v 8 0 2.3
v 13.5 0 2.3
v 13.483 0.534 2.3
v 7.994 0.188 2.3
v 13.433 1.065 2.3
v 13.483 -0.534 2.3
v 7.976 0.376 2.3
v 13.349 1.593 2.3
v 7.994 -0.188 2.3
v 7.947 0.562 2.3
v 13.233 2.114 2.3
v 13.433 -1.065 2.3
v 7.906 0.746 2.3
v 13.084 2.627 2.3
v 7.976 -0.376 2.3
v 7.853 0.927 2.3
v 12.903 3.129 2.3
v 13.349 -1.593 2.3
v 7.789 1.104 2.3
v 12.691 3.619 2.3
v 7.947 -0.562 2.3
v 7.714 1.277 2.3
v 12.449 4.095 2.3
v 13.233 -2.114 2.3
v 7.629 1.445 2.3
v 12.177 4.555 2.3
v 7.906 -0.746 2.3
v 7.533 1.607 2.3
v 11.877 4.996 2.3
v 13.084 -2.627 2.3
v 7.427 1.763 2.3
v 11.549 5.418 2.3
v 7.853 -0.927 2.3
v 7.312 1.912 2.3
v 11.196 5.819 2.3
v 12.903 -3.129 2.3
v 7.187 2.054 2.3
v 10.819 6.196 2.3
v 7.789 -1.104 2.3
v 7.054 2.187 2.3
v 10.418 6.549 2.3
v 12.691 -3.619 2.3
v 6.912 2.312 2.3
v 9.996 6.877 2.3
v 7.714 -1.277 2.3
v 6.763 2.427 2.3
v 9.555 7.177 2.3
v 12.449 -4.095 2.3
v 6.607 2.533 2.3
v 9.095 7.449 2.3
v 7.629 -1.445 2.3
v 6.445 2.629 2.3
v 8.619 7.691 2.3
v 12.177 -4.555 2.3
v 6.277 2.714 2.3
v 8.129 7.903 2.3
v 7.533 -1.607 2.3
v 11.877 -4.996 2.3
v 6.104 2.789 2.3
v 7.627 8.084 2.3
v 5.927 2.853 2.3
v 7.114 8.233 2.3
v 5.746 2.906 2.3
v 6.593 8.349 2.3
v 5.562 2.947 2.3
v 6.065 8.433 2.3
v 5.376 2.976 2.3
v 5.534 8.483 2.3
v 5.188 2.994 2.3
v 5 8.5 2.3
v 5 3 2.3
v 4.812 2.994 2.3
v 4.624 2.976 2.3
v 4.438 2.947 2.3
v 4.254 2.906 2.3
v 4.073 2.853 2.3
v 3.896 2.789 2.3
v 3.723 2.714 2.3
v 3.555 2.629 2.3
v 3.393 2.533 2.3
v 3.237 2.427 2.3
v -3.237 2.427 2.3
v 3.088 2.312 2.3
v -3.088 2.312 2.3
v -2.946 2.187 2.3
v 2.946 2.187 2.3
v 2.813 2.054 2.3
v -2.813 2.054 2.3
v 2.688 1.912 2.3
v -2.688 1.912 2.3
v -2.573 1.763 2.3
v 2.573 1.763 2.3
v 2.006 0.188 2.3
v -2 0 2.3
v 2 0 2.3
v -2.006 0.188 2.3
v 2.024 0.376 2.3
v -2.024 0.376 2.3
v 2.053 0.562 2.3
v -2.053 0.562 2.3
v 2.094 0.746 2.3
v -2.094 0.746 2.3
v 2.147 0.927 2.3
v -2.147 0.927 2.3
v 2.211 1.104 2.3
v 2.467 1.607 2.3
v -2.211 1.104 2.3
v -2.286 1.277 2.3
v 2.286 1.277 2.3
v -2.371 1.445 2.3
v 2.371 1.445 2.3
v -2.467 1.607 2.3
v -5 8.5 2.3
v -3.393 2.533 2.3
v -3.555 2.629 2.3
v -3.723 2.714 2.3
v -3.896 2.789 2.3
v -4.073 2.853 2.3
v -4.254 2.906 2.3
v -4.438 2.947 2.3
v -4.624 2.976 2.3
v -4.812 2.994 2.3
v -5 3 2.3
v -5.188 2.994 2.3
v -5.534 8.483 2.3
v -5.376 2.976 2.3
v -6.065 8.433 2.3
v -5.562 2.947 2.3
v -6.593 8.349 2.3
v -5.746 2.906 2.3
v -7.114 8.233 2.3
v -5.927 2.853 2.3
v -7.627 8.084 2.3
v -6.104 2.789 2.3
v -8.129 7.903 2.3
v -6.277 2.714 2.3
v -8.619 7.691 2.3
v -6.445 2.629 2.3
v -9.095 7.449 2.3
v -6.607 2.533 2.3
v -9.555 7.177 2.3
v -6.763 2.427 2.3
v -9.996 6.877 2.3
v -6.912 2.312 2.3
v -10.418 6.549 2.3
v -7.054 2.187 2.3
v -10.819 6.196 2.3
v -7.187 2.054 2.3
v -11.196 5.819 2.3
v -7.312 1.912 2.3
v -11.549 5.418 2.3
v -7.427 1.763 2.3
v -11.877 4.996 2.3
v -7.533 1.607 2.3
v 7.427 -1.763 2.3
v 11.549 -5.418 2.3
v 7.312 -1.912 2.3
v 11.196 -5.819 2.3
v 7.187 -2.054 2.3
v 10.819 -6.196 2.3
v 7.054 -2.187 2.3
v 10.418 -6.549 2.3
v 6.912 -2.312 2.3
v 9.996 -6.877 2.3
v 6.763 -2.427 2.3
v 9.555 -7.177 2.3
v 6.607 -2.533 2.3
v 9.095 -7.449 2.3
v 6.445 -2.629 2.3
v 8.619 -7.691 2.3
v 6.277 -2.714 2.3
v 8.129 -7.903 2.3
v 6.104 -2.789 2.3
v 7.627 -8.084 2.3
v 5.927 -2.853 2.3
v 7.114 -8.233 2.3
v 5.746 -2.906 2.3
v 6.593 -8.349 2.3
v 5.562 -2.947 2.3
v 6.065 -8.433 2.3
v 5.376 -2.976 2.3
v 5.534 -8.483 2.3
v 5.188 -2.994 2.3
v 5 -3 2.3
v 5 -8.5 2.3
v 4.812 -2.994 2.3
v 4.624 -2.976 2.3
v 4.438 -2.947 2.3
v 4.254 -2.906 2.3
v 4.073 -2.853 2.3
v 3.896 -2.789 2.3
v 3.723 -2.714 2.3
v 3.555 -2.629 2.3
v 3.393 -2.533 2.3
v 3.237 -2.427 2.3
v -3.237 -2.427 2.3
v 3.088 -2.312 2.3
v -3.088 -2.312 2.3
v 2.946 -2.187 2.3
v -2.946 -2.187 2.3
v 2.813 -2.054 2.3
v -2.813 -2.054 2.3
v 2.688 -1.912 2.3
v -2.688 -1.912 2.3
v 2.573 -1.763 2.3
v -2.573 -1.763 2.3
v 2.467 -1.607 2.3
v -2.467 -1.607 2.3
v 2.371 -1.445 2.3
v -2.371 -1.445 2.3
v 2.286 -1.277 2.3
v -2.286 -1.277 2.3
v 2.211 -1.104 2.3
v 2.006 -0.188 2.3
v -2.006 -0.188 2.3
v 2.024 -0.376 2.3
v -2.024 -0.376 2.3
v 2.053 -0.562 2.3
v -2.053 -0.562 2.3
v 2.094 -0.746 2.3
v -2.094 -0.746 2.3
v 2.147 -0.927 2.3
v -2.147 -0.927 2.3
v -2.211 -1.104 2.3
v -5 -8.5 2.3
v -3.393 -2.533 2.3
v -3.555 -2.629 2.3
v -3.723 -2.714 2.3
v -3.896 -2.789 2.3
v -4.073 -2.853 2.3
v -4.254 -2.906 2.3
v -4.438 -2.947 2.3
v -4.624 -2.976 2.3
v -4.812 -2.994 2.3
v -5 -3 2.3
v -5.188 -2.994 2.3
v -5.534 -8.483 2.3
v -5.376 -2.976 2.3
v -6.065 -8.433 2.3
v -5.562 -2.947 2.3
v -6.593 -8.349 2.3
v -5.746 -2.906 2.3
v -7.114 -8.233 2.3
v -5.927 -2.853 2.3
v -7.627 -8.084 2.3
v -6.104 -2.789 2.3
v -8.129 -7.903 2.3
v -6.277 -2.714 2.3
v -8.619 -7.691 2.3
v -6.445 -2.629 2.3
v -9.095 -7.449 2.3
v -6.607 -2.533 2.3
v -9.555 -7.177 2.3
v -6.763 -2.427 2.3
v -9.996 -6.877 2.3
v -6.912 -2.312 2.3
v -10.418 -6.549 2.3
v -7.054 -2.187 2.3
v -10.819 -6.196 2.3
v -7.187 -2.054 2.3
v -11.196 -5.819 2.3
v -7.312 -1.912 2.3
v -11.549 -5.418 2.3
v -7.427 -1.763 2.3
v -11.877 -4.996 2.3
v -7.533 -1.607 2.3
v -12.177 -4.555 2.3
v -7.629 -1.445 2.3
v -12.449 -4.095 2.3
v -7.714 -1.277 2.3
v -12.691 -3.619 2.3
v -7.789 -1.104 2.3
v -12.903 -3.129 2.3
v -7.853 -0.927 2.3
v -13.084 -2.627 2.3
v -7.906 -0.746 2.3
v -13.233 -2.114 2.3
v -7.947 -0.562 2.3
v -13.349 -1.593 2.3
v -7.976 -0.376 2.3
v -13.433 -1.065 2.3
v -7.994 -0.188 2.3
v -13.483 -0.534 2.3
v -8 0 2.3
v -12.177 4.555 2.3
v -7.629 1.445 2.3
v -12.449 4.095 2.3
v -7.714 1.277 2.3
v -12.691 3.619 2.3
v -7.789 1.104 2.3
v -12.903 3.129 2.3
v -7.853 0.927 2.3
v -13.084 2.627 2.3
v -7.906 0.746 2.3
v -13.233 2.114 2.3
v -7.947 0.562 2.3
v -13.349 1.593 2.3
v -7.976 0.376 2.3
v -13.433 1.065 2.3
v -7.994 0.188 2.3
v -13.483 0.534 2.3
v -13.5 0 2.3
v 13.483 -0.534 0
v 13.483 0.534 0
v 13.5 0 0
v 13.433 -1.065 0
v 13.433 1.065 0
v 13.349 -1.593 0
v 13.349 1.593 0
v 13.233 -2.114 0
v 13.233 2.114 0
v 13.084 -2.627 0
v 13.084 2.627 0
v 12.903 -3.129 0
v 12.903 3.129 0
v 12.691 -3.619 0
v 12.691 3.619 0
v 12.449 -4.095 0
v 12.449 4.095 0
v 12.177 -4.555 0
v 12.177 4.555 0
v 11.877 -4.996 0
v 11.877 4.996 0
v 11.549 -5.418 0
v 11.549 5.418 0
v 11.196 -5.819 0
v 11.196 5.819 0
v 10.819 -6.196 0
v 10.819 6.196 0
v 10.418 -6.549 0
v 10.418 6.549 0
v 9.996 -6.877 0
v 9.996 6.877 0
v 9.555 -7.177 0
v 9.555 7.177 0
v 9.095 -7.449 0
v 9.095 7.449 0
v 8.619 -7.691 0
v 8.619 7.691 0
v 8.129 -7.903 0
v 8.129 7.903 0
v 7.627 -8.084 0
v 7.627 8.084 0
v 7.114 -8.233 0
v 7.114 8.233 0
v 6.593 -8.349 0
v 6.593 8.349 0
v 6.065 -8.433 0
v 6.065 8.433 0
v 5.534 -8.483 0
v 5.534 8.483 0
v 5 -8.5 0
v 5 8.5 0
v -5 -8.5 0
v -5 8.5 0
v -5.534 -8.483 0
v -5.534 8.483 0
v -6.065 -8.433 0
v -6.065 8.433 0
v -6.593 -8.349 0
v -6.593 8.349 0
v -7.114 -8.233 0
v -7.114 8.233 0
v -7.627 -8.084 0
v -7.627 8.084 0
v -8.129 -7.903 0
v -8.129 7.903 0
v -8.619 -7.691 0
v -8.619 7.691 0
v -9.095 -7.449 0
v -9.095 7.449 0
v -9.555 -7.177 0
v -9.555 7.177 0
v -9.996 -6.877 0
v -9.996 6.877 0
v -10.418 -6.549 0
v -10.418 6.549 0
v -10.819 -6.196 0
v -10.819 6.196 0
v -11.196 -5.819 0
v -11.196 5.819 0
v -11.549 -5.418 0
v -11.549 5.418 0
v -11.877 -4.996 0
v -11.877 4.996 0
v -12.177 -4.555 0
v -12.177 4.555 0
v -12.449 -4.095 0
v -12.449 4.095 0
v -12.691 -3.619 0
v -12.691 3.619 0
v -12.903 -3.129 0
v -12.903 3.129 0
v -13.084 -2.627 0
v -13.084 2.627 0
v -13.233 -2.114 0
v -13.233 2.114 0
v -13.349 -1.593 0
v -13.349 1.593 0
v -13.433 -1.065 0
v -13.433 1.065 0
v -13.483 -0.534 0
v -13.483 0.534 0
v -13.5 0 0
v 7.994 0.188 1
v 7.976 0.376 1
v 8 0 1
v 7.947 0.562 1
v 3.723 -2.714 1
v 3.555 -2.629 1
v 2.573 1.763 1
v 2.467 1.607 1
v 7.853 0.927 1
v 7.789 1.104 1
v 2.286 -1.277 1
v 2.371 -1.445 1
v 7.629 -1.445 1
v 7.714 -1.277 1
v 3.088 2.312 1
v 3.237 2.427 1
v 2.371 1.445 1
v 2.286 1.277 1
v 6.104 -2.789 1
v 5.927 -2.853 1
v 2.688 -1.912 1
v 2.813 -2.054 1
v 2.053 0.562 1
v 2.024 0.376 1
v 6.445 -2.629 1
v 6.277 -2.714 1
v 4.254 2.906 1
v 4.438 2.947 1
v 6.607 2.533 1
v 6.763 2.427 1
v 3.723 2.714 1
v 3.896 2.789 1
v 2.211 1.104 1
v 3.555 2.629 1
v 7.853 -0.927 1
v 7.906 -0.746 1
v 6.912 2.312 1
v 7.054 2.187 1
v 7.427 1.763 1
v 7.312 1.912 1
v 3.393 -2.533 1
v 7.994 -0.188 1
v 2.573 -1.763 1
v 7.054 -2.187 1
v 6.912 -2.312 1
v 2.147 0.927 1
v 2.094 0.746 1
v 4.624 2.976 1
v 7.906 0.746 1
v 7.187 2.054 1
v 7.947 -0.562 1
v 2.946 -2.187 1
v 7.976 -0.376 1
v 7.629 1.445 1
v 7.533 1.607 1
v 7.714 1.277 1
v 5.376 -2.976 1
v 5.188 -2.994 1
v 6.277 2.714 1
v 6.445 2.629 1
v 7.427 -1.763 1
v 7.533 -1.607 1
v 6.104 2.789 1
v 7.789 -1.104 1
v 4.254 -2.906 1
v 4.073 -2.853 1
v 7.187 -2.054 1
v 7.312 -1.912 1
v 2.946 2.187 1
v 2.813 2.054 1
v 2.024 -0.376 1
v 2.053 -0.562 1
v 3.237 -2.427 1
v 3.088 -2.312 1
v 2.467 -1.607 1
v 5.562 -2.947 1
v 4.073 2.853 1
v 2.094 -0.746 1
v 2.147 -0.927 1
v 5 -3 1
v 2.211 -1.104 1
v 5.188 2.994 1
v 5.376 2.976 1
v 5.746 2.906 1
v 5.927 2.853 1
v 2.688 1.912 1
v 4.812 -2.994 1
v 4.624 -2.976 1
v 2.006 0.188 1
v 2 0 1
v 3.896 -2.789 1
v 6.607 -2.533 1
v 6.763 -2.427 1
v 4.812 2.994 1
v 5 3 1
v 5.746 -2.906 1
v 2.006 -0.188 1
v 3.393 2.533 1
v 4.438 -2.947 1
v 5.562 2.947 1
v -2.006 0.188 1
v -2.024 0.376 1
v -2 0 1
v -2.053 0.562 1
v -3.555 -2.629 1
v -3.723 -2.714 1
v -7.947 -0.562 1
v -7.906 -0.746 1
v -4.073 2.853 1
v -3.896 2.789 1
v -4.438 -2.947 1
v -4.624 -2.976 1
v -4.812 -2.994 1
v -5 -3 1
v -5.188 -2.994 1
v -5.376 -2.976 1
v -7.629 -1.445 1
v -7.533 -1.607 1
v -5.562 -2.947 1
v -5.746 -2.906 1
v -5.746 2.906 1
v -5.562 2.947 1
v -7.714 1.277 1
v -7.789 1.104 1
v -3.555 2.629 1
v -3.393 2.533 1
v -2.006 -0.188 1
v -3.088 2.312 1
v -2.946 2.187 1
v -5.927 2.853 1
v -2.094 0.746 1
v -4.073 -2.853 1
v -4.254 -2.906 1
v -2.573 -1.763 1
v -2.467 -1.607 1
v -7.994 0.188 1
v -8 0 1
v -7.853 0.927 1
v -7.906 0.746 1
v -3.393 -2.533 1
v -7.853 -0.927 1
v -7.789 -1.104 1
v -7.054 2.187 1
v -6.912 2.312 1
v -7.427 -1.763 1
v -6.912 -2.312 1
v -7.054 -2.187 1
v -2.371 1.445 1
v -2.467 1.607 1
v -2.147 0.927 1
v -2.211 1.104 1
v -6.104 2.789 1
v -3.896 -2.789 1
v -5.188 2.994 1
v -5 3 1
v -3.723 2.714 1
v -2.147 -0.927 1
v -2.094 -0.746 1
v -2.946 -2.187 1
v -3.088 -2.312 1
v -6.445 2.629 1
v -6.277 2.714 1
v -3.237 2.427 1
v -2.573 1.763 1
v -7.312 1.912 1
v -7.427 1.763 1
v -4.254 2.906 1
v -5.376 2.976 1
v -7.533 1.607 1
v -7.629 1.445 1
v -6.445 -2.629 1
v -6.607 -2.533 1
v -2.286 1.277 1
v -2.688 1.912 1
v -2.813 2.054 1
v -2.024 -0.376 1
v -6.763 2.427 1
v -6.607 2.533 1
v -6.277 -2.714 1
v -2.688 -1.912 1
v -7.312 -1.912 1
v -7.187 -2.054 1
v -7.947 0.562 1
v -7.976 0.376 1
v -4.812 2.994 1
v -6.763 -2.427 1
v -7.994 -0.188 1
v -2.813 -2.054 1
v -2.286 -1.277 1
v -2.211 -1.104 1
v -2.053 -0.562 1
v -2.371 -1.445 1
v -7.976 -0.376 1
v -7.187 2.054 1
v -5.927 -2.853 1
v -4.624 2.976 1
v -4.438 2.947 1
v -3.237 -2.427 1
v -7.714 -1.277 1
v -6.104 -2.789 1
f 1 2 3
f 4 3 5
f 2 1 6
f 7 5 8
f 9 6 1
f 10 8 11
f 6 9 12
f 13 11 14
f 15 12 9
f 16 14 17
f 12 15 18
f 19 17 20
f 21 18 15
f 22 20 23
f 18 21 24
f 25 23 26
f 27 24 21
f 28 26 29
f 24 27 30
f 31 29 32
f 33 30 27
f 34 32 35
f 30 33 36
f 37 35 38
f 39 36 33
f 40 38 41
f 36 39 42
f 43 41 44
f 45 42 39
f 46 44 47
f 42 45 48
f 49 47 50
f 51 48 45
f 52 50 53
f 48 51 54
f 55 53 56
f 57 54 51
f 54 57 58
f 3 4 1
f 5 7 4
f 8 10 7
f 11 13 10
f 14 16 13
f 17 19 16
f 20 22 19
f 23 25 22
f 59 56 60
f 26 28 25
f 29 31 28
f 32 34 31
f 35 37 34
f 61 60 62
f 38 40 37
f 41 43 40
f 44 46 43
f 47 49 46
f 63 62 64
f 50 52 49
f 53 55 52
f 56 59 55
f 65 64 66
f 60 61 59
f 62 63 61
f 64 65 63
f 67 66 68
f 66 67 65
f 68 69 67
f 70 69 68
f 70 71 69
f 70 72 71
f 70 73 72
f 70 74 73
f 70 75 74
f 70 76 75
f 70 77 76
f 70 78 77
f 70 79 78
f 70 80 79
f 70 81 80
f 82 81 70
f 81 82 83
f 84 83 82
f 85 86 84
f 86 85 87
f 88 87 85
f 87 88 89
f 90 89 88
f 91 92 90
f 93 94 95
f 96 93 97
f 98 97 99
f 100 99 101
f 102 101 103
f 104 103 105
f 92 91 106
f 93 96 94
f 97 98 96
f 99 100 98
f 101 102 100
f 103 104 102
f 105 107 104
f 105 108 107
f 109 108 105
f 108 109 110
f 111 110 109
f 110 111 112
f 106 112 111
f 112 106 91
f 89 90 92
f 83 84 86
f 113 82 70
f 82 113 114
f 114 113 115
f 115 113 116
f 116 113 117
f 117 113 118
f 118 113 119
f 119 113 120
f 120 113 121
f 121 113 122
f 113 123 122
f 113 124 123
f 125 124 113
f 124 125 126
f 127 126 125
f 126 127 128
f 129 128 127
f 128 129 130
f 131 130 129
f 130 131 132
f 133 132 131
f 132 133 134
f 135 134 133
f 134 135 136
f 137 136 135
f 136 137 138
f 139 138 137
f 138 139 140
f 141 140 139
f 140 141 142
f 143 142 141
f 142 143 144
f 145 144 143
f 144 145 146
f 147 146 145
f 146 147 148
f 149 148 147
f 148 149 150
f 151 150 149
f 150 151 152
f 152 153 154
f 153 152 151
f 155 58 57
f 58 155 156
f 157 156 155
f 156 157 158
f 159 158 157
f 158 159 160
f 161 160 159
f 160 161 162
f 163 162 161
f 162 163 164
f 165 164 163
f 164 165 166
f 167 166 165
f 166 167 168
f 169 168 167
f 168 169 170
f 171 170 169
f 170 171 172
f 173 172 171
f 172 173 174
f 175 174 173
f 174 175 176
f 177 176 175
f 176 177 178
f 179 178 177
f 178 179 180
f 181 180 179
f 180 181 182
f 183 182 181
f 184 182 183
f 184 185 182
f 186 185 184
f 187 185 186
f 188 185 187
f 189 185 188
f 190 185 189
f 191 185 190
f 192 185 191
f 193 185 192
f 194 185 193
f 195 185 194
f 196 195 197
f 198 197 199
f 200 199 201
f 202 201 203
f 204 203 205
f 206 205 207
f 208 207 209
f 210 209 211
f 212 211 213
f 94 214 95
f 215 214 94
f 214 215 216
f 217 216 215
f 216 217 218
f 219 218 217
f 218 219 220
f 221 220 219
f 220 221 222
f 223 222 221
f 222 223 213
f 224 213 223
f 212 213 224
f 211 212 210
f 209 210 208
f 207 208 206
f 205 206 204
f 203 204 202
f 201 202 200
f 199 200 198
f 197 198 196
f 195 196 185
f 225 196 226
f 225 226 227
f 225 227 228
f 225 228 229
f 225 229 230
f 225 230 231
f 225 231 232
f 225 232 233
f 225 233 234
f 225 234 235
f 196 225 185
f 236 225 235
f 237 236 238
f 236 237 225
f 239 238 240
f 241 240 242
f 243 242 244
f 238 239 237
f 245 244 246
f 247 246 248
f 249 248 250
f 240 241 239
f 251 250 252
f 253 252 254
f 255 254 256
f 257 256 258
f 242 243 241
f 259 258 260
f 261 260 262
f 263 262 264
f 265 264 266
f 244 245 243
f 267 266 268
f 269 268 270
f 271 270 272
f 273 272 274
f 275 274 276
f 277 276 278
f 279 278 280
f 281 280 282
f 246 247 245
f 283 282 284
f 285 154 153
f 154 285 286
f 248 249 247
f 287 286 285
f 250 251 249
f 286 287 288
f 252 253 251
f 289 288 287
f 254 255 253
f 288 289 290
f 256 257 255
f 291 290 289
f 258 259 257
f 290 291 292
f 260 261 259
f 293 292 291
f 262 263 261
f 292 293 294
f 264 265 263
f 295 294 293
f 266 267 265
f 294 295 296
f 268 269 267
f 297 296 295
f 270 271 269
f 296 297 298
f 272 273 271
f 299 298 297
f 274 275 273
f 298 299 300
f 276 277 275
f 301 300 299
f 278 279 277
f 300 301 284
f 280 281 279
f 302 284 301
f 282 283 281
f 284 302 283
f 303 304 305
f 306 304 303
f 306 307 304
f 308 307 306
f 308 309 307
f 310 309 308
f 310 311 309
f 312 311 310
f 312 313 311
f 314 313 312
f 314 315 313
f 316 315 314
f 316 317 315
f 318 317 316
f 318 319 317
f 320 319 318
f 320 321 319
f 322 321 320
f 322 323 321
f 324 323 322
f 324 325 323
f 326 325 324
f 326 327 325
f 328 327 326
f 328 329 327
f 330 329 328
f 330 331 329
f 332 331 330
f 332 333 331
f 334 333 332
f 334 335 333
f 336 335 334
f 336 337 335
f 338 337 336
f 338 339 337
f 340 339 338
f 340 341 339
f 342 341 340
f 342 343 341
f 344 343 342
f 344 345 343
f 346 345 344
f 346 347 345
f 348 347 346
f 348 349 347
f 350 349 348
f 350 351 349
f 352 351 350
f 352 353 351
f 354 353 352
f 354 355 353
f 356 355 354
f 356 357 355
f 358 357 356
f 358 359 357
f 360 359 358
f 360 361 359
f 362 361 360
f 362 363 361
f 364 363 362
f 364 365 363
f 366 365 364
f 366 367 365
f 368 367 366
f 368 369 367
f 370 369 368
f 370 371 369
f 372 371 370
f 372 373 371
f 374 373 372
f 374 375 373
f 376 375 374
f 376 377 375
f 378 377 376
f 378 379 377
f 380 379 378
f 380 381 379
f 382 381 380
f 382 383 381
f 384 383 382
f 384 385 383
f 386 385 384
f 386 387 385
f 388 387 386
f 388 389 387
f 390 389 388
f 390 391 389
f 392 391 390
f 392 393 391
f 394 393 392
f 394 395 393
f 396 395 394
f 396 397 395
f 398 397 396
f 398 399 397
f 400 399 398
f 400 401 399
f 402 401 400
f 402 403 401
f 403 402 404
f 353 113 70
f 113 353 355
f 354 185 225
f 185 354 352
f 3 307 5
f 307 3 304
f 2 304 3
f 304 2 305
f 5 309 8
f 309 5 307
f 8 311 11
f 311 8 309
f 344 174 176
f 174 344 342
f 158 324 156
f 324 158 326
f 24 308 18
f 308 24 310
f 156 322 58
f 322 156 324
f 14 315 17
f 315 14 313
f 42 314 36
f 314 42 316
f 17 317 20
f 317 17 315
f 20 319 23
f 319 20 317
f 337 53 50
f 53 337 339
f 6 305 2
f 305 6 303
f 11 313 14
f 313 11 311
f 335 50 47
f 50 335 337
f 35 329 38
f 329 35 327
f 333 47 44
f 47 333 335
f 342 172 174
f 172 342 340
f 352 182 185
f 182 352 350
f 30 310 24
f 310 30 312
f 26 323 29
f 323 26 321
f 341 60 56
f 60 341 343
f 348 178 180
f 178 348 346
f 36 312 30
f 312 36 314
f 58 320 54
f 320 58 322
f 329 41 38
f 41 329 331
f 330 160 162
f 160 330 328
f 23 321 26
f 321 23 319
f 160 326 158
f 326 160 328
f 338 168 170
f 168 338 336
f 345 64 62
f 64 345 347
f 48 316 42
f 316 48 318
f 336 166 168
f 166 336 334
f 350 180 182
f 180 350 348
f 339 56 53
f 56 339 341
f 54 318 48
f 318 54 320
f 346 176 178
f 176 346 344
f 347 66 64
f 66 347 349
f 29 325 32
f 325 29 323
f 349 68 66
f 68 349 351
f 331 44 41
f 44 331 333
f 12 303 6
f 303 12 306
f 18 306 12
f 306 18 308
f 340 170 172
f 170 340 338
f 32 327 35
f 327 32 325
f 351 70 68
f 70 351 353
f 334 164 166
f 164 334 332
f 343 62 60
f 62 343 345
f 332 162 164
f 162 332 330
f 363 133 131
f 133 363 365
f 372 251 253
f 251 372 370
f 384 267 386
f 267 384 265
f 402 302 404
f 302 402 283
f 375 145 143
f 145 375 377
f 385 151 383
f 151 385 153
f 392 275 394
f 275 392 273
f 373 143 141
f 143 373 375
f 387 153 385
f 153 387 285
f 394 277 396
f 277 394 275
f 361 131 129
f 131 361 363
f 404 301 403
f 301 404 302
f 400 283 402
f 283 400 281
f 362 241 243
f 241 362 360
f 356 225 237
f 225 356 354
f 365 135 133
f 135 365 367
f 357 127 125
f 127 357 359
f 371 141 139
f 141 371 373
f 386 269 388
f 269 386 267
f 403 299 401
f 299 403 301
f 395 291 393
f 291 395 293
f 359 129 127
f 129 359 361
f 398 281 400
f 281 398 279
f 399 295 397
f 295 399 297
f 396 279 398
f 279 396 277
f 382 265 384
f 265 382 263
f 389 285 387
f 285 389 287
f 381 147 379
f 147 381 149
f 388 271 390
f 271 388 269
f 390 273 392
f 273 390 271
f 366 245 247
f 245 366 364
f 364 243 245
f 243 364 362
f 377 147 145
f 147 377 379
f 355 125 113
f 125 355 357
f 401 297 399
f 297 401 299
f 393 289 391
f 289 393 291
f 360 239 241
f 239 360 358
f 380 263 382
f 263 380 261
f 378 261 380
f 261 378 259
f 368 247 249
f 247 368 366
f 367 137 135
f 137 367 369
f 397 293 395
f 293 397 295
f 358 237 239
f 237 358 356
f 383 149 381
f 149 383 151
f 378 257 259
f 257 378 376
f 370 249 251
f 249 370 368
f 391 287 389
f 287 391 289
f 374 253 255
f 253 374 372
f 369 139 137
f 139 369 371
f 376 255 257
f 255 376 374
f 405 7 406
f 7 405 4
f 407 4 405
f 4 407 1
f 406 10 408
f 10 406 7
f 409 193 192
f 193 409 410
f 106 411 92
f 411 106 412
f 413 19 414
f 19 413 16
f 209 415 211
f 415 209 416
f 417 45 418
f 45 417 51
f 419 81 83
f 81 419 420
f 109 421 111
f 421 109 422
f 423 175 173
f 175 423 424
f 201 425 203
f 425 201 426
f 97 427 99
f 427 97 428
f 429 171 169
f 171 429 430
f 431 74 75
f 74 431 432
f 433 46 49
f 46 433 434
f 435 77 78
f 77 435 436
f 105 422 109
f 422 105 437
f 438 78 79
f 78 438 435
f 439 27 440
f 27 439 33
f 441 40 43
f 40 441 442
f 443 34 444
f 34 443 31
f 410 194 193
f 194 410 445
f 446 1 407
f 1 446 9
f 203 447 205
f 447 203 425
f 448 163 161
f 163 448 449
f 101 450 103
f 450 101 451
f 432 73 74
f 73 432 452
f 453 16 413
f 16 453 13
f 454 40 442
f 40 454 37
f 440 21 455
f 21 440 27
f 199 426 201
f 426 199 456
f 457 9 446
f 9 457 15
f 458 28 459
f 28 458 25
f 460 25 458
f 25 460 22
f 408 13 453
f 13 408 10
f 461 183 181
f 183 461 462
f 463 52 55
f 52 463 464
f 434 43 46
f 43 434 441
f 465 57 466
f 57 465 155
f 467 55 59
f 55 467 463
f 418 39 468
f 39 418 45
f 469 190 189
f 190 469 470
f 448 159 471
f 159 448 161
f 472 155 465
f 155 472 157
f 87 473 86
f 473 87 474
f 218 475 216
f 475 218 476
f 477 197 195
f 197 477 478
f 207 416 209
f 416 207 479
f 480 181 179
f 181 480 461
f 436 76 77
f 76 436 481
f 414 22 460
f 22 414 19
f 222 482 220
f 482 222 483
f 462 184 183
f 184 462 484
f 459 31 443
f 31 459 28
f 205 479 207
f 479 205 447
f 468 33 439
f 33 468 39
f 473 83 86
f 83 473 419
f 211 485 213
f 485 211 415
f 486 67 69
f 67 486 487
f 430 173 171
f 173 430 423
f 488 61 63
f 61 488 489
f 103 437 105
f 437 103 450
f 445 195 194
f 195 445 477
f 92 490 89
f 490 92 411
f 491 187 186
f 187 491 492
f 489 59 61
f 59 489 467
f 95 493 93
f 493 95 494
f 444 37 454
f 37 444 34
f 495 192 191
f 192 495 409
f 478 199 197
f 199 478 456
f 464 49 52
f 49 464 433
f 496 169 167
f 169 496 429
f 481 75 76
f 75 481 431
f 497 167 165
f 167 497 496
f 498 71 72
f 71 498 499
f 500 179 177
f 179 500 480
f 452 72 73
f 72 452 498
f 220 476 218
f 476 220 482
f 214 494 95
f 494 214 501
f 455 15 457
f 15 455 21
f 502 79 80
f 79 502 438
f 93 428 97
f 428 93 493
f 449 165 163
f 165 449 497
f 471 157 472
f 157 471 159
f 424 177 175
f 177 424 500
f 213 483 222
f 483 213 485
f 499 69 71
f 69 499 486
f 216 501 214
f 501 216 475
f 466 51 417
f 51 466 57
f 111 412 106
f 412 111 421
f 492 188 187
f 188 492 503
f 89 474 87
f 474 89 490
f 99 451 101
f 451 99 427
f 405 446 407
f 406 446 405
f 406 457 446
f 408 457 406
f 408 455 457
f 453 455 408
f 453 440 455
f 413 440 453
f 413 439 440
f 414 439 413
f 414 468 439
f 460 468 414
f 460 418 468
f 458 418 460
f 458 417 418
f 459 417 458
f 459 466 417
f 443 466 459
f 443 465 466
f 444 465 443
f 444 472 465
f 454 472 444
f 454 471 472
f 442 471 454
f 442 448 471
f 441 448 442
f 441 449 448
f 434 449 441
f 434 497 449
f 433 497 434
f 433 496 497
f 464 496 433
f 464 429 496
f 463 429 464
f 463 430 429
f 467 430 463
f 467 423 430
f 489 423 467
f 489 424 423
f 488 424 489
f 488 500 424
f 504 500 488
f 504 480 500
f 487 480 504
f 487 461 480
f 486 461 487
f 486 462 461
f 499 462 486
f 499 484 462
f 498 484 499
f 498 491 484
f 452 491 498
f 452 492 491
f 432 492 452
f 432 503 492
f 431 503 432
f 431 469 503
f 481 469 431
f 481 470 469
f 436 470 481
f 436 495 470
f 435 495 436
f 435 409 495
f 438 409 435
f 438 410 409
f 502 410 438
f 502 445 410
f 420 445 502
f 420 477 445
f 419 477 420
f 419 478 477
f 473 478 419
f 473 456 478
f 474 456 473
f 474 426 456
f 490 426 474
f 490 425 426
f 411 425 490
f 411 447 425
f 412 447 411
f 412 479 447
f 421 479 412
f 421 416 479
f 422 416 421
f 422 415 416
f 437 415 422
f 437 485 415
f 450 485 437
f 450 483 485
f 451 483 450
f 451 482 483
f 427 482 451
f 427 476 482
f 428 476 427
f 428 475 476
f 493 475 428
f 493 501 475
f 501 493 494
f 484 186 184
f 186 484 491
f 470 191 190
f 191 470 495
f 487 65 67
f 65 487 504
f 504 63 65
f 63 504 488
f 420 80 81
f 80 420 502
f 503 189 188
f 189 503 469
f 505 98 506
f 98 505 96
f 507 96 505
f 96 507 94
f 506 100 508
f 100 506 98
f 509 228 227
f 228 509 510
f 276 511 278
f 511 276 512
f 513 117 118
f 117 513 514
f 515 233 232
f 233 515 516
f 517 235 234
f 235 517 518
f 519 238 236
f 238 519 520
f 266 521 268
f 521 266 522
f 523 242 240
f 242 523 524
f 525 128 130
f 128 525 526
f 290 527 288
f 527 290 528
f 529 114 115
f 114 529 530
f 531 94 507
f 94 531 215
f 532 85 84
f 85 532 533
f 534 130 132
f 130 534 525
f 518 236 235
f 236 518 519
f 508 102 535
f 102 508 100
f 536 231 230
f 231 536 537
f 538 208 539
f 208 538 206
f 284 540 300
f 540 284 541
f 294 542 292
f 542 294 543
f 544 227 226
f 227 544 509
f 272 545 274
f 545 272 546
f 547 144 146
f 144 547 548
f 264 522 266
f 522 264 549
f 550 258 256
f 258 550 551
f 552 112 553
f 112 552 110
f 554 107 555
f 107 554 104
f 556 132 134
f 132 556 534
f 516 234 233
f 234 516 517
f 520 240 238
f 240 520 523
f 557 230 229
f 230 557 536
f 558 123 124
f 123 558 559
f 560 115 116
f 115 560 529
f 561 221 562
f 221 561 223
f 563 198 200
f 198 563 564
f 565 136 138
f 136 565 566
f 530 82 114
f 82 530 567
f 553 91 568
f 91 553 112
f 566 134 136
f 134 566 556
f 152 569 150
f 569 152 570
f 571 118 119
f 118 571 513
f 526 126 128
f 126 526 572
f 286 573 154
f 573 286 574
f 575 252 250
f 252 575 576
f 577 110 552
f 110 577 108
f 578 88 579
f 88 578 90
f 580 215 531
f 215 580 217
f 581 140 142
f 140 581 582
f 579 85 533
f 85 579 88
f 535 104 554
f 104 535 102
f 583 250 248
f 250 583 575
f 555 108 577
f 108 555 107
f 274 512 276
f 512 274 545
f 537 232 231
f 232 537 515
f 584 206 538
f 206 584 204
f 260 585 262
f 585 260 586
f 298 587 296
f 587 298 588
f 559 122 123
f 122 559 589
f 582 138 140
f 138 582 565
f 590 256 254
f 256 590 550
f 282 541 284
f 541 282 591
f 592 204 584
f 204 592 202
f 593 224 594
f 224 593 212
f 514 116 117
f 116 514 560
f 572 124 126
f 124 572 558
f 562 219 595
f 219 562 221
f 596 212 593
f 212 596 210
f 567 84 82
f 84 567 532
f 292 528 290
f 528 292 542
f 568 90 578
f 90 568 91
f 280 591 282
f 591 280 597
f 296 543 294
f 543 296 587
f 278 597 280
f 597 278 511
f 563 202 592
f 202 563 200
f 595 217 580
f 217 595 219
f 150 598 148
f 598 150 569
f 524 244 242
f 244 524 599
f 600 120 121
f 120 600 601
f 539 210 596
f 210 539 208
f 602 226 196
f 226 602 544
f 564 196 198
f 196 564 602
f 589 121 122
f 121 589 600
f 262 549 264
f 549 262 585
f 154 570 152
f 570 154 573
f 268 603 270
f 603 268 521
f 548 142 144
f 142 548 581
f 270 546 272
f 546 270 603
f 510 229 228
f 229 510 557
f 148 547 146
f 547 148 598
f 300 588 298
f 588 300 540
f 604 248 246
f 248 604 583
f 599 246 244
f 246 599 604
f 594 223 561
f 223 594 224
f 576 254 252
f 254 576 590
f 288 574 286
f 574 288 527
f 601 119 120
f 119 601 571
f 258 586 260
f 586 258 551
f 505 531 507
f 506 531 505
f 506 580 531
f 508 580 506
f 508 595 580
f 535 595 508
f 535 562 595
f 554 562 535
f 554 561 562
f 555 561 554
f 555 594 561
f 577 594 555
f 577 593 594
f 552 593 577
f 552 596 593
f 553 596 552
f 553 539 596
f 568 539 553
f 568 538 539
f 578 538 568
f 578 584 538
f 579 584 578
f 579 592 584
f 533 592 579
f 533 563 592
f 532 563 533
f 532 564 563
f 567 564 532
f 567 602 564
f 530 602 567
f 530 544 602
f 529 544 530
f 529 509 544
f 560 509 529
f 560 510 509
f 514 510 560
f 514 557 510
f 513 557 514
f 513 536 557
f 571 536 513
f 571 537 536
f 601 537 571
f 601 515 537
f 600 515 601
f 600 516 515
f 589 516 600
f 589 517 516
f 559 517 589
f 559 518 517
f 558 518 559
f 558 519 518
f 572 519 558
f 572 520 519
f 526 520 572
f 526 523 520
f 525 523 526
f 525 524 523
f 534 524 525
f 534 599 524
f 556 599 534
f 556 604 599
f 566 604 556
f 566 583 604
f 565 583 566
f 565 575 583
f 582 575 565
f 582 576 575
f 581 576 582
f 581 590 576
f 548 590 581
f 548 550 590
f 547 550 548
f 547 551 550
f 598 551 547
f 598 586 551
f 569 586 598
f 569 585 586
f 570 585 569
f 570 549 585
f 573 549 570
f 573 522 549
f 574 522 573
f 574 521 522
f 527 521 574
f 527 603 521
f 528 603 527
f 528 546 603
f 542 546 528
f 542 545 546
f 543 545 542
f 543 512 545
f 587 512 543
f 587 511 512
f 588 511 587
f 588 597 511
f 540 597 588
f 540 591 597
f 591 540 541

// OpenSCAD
difference(){
	union(){ 

              
            

        translate([-5, -8.5,0]){
           cube([10,17,2.3], center=false);
        }                
        translate([0+5,0,0]){
            rotate([0,0,0]){
                cylinder(h=2.3, r=8.5, $fn=100, center=false);
            }   
        }
        translate([0-5,0,0]){
            rotate([0,0,0]){
                cylinder(h=2.3, r=8.5, $fn=100, center=false);
            }   
        }





	}
	union() {


        translate([0+5,0,1]){
            rotate([0,0,0]){
                cylinder(h=5, r=3, $fn=100, center=false);
            }   
        }
        translate([0-5,0,1]){
            rotate([0,0,0]){
                cylinder(h=5, r=3, $fn=100, center=false);
            }   
        }

	}
}
